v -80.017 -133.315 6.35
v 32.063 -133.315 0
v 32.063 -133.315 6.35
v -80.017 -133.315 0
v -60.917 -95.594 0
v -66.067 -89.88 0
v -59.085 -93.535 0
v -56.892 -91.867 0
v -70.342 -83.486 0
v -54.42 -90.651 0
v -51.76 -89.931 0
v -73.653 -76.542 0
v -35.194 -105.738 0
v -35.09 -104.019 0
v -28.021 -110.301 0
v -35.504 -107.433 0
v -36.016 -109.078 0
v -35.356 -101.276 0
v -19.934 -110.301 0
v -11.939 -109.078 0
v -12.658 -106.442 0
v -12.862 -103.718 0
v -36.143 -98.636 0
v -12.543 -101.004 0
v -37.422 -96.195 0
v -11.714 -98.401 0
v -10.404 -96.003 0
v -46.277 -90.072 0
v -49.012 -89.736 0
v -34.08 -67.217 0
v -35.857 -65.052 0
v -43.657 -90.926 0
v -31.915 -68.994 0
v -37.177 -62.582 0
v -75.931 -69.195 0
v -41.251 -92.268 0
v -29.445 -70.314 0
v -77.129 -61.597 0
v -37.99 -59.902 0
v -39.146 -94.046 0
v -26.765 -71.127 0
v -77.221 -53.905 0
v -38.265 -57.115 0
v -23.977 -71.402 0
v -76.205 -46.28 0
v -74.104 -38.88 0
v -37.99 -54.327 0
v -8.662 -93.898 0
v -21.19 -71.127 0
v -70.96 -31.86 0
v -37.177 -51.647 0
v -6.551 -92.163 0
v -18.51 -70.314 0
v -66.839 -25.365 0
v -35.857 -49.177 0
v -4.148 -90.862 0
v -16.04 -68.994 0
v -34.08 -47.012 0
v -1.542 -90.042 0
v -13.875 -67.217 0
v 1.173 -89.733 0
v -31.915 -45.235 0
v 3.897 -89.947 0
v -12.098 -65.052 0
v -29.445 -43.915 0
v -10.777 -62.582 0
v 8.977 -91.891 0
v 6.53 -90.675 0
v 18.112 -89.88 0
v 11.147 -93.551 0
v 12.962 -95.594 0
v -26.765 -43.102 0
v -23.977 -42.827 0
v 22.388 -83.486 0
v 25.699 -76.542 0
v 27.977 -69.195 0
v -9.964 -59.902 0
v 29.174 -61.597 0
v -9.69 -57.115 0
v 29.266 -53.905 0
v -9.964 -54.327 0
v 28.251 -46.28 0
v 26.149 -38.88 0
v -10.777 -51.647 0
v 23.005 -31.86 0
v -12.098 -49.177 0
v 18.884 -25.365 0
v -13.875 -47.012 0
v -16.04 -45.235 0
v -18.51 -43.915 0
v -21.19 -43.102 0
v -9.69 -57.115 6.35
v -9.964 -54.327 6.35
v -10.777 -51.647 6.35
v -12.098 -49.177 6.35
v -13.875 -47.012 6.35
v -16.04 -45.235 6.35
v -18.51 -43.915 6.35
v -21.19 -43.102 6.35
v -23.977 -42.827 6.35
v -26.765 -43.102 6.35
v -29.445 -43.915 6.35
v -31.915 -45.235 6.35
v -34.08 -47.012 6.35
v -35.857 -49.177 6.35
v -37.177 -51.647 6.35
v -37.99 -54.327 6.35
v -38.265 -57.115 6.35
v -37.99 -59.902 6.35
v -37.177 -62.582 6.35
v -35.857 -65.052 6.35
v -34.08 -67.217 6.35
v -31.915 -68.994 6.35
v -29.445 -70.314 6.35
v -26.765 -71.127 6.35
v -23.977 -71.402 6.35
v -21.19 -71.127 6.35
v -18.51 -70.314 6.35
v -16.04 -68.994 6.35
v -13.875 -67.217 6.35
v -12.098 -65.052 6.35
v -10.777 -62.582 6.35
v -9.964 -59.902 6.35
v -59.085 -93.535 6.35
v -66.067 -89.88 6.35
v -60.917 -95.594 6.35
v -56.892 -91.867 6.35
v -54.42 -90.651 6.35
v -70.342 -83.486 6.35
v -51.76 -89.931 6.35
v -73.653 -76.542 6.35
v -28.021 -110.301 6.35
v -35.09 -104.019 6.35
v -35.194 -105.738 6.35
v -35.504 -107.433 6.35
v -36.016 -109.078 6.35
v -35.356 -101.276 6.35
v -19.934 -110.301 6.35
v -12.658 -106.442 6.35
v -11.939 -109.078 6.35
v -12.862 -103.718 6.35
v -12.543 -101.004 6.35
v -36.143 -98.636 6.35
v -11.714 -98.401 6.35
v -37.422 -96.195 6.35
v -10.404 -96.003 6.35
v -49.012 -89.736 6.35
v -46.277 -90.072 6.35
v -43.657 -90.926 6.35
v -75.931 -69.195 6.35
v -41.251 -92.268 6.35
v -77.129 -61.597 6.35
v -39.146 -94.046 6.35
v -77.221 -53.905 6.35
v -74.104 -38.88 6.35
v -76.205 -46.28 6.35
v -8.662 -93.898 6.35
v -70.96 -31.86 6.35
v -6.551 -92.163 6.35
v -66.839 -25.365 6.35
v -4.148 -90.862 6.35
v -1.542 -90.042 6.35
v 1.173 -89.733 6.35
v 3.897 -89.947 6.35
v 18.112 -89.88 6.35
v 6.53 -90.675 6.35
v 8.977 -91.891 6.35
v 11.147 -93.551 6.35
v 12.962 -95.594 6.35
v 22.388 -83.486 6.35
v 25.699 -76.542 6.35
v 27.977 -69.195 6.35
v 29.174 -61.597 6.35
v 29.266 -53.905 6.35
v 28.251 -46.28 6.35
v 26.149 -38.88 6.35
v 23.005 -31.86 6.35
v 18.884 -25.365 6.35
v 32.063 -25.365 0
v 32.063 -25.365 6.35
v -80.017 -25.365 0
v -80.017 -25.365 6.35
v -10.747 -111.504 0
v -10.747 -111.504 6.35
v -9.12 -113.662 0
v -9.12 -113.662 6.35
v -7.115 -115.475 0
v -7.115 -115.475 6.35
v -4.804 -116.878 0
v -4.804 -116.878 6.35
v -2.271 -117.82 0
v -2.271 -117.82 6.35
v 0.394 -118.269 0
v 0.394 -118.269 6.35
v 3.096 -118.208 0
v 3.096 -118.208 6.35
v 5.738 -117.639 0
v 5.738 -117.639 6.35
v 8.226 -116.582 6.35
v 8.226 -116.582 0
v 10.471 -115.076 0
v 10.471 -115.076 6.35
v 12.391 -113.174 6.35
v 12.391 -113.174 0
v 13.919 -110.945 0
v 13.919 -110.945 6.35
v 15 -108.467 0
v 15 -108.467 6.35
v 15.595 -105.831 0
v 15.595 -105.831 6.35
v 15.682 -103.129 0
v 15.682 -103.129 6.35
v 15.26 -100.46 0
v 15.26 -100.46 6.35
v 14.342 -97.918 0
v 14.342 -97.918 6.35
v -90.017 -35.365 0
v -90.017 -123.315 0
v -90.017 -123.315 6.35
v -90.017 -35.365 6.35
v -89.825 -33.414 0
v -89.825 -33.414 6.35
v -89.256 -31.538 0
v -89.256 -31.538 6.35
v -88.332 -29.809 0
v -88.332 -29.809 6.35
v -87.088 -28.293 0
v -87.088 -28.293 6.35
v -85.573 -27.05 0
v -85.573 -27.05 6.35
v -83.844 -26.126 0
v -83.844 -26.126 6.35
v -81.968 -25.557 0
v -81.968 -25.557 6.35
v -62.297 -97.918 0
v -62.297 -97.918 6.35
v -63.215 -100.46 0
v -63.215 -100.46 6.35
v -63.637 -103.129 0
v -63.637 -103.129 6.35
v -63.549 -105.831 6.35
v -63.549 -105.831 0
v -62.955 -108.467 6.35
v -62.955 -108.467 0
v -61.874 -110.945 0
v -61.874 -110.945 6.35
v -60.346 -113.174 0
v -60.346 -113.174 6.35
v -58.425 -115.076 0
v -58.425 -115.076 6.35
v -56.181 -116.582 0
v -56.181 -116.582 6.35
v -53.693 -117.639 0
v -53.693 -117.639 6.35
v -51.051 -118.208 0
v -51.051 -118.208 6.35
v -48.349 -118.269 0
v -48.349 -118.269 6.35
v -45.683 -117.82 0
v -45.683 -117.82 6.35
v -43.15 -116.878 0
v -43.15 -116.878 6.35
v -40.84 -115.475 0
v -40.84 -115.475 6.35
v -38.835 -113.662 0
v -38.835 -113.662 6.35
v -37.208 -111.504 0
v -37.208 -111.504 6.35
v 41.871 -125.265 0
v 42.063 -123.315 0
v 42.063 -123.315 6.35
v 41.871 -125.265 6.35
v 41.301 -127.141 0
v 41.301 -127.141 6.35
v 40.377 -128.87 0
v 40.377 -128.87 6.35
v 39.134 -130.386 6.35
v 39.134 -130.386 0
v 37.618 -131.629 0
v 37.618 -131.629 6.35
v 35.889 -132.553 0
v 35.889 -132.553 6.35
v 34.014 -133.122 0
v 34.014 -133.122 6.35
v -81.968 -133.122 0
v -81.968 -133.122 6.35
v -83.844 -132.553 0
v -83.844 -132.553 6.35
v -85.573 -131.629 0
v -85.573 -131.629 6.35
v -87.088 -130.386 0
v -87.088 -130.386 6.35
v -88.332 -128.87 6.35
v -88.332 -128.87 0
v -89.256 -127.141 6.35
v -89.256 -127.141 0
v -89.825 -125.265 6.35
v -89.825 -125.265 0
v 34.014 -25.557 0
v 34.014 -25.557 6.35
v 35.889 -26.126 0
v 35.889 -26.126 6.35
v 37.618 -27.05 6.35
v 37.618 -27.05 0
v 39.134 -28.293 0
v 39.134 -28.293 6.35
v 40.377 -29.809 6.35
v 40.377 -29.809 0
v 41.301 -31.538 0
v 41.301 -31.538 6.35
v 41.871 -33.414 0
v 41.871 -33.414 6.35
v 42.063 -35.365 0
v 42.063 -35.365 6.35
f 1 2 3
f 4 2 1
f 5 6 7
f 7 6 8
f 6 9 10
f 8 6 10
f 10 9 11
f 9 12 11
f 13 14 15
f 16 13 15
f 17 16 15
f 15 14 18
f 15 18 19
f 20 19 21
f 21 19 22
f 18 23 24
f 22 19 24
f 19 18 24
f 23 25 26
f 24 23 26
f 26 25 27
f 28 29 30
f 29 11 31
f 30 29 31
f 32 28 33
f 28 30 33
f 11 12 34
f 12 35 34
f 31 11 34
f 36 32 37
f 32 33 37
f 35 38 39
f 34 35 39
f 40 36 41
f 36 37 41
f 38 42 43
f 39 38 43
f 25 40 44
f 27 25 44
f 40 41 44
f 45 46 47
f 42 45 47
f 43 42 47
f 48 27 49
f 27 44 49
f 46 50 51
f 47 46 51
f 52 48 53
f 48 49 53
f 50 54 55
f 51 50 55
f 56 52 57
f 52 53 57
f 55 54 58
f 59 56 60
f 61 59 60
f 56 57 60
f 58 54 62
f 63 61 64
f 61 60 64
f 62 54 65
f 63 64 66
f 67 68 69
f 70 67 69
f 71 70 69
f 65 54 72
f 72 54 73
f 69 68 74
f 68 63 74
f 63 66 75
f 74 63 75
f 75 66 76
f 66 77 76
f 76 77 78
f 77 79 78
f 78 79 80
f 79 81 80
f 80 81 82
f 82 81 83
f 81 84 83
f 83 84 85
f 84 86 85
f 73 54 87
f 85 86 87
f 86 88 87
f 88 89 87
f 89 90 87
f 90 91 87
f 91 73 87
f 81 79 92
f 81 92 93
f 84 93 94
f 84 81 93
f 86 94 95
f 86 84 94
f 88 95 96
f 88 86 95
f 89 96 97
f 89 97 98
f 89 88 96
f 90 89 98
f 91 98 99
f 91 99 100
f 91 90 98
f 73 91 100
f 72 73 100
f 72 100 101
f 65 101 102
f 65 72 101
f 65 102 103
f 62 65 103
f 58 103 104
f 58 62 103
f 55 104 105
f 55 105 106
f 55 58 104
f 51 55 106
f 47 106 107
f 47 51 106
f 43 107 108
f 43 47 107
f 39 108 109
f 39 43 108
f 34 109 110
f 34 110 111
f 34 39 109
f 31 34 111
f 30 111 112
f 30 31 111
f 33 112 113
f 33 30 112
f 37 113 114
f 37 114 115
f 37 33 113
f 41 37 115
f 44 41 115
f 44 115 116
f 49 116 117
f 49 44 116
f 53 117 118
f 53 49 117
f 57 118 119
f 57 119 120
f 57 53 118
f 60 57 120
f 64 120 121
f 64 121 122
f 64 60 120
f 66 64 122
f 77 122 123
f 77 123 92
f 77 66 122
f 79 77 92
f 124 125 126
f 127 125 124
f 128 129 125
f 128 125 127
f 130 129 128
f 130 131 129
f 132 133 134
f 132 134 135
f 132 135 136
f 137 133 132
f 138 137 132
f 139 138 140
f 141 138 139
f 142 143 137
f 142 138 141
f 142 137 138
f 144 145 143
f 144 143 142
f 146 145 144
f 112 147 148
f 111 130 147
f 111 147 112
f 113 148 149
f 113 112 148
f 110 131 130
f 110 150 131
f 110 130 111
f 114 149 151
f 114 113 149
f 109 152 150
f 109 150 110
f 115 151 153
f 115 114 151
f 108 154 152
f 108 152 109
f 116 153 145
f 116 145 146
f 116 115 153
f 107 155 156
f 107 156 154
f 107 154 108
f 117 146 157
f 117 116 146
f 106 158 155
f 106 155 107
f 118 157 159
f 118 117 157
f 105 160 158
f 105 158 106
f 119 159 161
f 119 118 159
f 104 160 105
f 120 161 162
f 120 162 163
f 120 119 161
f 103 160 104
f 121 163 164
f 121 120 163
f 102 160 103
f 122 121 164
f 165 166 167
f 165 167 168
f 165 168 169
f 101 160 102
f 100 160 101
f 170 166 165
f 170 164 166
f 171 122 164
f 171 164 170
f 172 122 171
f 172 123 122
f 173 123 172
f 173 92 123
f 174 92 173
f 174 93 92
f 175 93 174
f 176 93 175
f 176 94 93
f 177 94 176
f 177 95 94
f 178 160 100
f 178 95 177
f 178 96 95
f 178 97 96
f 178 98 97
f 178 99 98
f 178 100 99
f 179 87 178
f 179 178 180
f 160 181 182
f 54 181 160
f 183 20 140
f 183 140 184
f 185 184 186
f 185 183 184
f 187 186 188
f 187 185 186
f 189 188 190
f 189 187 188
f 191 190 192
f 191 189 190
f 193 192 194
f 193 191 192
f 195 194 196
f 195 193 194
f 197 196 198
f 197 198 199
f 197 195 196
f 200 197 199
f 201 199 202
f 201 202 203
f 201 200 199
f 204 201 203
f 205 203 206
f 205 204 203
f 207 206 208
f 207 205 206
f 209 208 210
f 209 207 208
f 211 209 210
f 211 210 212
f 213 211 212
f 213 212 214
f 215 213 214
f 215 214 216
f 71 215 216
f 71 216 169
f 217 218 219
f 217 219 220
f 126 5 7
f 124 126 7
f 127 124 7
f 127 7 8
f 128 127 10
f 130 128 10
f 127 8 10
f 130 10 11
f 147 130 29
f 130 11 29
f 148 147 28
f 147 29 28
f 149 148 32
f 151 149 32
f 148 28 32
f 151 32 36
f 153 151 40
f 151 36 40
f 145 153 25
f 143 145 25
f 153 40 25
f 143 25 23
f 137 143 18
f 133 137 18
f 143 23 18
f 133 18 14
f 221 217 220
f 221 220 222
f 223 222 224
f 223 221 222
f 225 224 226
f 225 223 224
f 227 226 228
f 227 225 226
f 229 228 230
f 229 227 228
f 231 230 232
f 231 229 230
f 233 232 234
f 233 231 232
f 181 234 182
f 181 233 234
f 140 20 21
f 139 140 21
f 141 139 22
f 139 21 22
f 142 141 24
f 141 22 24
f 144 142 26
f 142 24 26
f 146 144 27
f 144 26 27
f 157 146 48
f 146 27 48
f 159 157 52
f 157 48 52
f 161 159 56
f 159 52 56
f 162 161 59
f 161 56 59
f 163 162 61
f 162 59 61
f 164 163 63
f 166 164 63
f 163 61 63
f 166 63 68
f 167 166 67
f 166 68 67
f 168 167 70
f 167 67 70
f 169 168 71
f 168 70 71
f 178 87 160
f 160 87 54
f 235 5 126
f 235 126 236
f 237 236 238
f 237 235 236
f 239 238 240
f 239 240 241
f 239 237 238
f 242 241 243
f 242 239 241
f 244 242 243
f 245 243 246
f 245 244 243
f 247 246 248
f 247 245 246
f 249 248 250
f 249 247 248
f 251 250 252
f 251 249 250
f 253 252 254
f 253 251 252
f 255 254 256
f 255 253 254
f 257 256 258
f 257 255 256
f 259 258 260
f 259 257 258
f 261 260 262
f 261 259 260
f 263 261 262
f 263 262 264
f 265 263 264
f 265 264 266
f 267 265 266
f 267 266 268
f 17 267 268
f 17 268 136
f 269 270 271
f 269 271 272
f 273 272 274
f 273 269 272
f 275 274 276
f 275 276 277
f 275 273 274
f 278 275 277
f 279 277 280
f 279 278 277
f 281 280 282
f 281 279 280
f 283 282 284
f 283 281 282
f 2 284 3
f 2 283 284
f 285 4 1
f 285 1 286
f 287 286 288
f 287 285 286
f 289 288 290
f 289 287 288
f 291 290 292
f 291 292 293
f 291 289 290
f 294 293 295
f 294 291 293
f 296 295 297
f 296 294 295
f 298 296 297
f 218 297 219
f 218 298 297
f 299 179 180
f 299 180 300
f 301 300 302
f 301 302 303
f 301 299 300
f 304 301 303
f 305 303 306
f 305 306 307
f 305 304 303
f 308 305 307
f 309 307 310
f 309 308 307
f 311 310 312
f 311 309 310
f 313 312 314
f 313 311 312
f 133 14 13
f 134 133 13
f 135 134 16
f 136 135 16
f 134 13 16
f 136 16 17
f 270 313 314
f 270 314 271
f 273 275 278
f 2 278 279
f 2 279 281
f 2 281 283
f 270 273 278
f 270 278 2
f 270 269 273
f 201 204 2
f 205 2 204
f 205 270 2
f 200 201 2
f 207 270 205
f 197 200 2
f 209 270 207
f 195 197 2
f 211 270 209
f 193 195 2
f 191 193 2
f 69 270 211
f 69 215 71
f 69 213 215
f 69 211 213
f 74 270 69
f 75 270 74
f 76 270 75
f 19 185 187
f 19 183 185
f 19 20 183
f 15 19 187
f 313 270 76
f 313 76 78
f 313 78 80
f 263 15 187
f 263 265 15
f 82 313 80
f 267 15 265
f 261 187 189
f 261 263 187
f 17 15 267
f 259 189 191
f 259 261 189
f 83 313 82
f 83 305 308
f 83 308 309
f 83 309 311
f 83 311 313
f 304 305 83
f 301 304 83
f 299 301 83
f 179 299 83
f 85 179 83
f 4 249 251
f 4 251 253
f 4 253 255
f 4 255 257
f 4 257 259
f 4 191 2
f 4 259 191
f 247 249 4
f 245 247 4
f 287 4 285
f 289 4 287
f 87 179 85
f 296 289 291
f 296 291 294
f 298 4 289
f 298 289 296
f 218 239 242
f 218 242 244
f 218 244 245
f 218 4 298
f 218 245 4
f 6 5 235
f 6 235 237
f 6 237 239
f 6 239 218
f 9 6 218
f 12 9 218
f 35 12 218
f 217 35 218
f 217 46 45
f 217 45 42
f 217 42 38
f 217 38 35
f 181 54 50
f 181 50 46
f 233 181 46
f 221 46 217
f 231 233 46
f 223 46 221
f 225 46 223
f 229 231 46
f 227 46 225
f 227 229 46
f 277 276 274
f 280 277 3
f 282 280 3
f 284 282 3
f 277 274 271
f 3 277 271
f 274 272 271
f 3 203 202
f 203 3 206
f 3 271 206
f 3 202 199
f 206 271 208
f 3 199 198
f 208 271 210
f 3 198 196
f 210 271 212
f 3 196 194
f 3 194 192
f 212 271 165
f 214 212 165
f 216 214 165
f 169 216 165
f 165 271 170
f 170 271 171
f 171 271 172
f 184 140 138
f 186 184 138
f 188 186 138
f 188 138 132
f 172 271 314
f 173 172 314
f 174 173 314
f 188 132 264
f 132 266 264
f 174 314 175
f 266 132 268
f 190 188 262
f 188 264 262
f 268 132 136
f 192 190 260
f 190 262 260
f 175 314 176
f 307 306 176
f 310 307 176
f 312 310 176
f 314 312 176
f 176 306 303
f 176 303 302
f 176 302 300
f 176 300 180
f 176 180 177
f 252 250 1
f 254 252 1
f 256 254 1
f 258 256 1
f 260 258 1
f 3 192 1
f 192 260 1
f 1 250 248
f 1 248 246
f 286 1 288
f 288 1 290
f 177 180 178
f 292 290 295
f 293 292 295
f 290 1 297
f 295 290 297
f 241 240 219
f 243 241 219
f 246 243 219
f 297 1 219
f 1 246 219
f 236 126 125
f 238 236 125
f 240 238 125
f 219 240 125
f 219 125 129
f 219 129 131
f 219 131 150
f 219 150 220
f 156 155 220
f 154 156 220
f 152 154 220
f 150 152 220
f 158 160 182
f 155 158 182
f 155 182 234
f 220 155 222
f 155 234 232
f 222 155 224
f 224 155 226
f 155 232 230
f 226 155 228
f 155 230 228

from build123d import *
from build123d.topology import SkipClean

# Parameters (mm, degrees)
SKETCH1_R           = 14.2875
SKETCH1_R_2         = 53.34
BOSS_EXTRUDE1_DEPTH = 6.35


with BuildPart() as part:
    # Sketch1 → Boss-Extrude1 (new body)
    # profile 1 of 2: a face of its own
    with SkipClean():  # the faces are left unmerged after this step: merging them gives an invalid solid
        with BuildSketch(Plane.XY):
            with BuildLine():
                Line((-80.017343047, -25.364503898), (32.062656953, -25.364503898))
                ThreePointArc((32.062656953, -25.364503898), (39.133724765, -28.293436086), (42.062656953, -35.364503898))
                Line((42.062656953, -35.364503898), (42.062656953, -123.314503898))
                ThreePointArc((42.062656953, -123.314503898), (39.133724765, -130.38557171), (32.062656953, -133.314503898))
                Line((32.062656953, -133.314503898), (-80.017343047, -133.314503898))
                ThreePointArc((-80.017343047, -133.314503898), (-87.088410859, -130.38557171), (-90.017343047, -123.314503898))
                Line((-90.017343047, -123.314503898), (-90.017343047, -35.364503898))
                ThreePointArc((-90.017343047, -35.364503898), (-87.088410859, -28.293436086), (-80.017343047, -25.364503898))
            make_face()
            with Locations((-49.377343047, -104.018614592)):
                Circle(SKETCH1_R, mode=Mode.SUBTRACT)
            with Locations((-23.977343047, -57.114503898)):
                Circle(SKETCH1_R_2, mode=Mode.SUBTRACT)
            with Locations((1.422656953, -104.018614592)):
                Circle(SKETCH1_R, mode=Mode.SUBTRACT)
        # profile 2 of 2: a face of its own
        with BuildSketch(Plane.XY):
            with BuildLine():
                Line((18.883981011, -25.364503898), (-66.838667105, -25.364503898))
                ThreePointArc((-66.838667105, -25.364503898), (-77.128704465, -61.596510075), (-60.916565887, -95.593711477))
                ThreePointArc((-60.916565887, -95.593711477), (-44.94642836, -90.435549721), (-35.089843047, -104.018614592))
                ThreePointArc((-35.089843047, -104.018614592), (-35.3232221, -106.59045064), (-36.015735002, -109.078267418))
                ThreePointArc((-36.015735002, -109.078267418), (-23.977343047, -110.454503898), (-11.938951091, -109.078267418))
                ThreePointArc((-11.938951091, -109.078267418), (-5.380914475, -91.455013513), (12.961879794, -95.593711477))
                ThreePointArc((12.961879794, -95.593711477), (25.091454301, -78.028822602), (29.362656953, -57.114503898))
                ThreePointArc((29.362656953, -57.114503898), (26.67529077, -40.397258689), (18.883981011, -25.364503898))
            make_face()
            with Locations((-23.977343047, -57.114503898)):
                Circle(SKETCH1_R, mode=Mode.SUBTRACT)
        extrude(amount=BOSS_EXTRUDE1_DEPTH)


solid = part.part
